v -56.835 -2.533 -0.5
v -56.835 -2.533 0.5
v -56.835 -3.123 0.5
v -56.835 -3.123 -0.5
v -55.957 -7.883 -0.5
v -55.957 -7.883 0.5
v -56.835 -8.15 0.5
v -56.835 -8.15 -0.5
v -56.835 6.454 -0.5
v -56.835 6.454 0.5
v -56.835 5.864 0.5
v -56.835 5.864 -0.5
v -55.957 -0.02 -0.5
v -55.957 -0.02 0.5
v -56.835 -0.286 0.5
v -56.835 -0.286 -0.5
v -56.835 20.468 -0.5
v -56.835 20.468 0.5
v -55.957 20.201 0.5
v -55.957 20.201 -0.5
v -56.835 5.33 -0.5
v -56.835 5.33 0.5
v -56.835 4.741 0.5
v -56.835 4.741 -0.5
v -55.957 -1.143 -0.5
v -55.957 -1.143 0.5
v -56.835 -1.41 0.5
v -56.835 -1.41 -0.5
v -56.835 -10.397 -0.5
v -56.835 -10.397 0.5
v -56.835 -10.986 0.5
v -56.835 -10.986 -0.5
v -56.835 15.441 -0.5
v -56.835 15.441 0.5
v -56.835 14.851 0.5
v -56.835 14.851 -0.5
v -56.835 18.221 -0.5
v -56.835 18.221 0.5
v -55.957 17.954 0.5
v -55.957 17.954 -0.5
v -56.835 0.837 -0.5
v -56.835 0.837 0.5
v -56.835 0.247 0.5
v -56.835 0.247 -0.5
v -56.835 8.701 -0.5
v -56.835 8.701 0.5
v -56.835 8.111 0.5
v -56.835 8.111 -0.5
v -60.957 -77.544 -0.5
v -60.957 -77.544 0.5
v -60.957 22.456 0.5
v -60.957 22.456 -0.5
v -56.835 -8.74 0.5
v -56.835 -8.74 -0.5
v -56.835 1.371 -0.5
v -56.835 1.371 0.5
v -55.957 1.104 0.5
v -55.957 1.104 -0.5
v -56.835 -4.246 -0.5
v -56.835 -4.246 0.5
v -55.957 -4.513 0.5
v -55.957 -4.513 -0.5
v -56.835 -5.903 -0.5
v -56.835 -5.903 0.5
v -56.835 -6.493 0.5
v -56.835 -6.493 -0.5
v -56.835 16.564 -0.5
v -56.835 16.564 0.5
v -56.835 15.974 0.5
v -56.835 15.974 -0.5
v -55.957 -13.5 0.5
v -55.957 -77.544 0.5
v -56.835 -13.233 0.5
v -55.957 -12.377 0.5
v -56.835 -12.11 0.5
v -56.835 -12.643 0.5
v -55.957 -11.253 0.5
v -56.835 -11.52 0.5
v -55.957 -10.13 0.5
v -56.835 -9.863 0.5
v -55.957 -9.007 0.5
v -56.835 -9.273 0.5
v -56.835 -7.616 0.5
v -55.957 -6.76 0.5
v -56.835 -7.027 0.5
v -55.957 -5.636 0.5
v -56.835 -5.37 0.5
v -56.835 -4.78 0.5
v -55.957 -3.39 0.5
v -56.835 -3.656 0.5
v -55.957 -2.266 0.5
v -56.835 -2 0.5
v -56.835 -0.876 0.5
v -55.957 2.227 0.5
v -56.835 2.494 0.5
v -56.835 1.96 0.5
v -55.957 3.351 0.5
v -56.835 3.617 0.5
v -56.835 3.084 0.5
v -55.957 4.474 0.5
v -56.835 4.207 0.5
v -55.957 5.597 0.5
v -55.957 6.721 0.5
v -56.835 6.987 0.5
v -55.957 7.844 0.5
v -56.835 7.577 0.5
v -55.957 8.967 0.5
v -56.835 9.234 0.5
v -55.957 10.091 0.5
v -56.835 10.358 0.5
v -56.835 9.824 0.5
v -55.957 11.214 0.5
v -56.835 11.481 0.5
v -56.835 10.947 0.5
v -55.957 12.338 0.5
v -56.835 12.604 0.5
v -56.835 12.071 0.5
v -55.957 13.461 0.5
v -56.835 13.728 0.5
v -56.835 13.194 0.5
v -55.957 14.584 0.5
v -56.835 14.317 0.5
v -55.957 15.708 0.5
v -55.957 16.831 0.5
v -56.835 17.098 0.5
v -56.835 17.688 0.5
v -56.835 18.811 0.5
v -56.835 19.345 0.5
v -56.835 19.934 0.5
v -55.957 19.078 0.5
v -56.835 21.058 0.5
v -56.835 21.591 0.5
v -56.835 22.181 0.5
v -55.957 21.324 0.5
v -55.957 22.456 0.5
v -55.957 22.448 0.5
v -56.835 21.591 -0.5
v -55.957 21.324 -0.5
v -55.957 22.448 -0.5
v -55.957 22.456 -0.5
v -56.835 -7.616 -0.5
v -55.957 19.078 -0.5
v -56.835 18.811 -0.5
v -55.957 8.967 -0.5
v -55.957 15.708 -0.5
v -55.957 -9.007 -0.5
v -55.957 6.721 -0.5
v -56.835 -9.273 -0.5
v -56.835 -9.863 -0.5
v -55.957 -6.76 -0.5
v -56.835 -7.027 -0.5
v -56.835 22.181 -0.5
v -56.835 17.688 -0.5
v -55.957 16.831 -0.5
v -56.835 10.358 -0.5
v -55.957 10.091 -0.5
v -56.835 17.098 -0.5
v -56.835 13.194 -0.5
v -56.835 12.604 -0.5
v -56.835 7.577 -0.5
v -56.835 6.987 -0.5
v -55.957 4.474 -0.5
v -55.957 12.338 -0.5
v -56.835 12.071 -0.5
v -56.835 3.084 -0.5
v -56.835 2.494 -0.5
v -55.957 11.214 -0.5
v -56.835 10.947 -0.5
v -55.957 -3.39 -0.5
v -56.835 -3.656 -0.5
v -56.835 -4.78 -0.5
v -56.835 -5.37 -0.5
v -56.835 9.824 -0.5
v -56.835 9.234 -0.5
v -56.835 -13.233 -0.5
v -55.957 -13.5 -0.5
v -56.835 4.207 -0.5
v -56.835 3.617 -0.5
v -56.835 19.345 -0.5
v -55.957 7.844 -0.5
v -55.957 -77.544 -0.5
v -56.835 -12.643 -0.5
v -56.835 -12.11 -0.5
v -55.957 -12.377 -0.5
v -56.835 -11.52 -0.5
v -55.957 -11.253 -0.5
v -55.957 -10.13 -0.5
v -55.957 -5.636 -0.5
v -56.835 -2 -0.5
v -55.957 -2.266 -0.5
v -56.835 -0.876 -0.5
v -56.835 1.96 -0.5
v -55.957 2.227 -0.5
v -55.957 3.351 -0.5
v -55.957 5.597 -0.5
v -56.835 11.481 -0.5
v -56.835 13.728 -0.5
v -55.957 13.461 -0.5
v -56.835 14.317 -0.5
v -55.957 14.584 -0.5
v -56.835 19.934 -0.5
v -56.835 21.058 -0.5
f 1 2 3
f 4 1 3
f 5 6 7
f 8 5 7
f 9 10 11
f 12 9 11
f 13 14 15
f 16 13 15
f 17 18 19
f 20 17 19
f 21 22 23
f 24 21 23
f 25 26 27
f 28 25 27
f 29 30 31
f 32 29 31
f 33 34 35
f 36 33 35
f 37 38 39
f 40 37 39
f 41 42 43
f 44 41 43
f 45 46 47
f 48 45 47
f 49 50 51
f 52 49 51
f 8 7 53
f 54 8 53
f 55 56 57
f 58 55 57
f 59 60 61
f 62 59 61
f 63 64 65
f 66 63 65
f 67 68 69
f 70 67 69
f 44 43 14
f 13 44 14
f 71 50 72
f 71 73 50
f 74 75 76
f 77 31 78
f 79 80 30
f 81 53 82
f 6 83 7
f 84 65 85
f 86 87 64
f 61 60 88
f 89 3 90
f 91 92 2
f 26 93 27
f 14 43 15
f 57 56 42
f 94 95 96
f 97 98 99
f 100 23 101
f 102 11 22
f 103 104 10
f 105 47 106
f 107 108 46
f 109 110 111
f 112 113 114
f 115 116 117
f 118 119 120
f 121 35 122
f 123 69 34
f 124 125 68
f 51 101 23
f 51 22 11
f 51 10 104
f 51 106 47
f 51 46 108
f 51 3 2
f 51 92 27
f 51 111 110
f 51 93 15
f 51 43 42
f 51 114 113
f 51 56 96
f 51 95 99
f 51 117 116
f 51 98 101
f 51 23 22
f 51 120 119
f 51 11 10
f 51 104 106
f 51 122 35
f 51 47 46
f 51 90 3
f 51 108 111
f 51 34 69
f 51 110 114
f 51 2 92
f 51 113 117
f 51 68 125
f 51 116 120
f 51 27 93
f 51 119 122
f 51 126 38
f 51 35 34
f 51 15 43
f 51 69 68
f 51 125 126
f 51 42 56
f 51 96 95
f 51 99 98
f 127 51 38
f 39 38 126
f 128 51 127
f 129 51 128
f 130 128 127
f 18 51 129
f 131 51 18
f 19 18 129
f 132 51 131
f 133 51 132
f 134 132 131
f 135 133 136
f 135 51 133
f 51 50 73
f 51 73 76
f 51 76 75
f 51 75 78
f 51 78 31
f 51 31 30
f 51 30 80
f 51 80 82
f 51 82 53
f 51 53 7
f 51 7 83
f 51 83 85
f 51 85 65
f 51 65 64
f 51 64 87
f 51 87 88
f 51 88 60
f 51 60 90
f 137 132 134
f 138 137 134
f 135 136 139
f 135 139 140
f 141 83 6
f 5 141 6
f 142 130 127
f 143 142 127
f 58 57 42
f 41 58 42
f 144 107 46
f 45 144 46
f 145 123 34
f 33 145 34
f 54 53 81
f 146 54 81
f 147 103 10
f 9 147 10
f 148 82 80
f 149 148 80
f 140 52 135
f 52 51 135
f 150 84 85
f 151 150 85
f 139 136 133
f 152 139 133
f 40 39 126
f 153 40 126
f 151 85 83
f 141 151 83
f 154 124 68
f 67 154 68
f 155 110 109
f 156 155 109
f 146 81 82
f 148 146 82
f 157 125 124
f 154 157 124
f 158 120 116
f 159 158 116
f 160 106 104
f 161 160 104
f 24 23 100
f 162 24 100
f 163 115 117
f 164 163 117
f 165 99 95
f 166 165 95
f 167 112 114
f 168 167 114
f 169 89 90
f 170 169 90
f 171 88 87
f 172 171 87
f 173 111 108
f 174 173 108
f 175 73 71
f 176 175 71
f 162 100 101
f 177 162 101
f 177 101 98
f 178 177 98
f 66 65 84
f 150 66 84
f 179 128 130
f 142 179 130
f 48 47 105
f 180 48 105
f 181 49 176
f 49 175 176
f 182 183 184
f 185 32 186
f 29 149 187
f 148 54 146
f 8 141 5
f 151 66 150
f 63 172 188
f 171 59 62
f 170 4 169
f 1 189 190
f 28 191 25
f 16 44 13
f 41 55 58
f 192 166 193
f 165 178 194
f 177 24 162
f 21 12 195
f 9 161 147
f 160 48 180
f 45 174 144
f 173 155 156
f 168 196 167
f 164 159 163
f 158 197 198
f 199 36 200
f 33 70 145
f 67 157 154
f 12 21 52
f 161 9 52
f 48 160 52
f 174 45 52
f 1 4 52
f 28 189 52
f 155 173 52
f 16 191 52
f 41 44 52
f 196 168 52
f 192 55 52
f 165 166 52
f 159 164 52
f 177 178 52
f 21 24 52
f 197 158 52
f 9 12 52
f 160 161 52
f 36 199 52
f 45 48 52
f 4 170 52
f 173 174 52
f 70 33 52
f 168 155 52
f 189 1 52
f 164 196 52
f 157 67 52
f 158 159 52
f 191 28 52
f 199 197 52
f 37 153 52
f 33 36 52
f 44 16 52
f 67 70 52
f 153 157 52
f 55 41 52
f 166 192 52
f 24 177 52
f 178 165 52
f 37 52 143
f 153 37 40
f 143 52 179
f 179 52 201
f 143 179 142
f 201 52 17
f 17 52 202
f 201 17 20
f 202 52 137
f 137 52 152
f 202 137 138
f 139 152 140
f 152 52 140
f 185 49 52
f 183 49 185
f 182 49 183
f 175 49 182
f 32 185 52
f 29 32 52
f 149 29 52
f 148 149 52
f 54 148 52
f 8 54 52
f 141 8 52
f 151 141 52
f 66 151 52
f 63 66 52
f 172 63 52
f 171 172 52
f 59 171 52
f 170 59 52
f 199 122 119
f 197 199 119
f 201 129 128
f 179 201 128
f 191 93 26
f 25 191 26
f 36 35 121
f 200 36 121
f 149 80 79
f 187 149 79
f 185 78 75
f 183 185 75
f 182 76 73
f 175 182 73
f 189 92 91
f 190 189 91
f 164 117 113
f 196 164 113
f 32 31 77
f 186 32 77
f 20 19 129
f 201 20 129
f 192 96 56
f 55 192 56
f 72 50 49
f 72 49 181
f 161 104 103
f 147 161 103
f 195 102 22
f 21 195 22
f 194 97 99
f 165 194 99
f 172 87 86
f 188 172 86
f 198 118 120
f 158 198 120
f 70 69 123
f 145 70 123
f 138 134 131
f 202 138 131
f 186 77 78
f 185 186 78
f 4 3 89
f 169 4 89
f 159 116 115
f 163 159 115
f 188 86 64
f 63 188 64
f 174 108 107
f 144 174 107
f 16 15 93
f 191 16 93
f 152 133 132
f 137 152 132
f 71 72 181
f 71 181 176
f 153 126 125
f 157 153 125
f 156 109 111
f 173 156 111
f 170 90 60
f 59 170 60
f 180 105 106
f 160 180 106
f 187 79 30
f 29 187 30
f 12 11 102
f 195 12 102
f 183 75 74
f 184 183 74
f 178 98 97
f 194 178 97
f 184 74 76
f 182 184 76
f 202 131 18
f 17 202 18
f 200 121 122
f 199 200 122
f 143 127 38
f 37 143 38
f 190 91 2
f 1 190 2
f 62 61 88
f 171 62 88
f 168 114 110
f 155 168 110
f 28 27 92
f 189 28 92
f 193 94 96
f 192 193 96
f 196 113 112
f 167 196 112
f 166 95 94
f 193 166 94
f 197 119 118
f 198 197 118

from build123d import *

# Parameters (mm, degrees)
F0_W     = 5
F0_H     = 100
F1_DEPTH = 0.5
F3_DEPTH = 25


with BuildPart() as f1:
    # F0 (on Top) → F1 (new body, symmetric)
    with BuildSketch(Plane.XY):
        with Locations((-58.457311, -27.543506)):
            Rectangle(F0_W, F0_H)
    extrude(amount=F1_DEPTH, both=True)

    # F2 (on face) → F3 (cut)
    with BuildSketch(Plane.XY.offset(0.5)):
        Polygon((-55.957311, 22.447845), (-56.83507, 22.18105), (-56.83507, 21.59127), (-55.957311, 21.324475), align=None)
        Polygon((-55.957311, 20.201105), (-55.957311, 21.324475), (-56.83507, 21.05768), (-56.83507, 20.4679), align=None)
        Polygon((-55.957311, 19.077735), (-55.957311, 20.201105), (-56.83507, 19.93431), (-56.83507, 19.34453), align=None)
        Polygon((-55.957311, 17.954365), (-55.957311, 19.077735), (-56.83507, 18.81094), (-56.83507, 18.22116), align=None)
        Polygon((-55.957311, 16.830995), (-55.957311, 17.954365), (-56.83507, 17.68757), (-56.83507, 17.09779), align=None)
        Polygon((-55.957311, 15.707625), (-55.957311, 16.830995), (-56.83507, 16.5642), (-56.83507, 15.97442), align=None)
        Polygon((-55.957311, 14.584255), (-55.957311, 15.707625), (-56.83507, 15.44083), (-56.83507, 14.85105), align=None)
        Polygon((-55.957311, 13.460885), (-55.957311, 14.584255), (-56.83507, 14.31746), (-56.83507, 13.72768), align=None)
        Polygon((-55.957311, 12.337515), (-55.957311, 13.460885), (-56.83507, 13.19409), (-56.83507, 12.60431), align=None)
        Polygon((-55.957311, 11.214145), (-55.957311, 12.337515), (-56.83507, 12.07072), (-56.83507, 11.48094), align=None)
        Polygon((-55.957311, 10.090775), (-55.957311, 11.214145), (-56.83507, 10.94735), (-56.83507, 10.35757), align=None)
        Polygon((-55.957311, 8.967405), (-55.957311, 10.090775), (-56.83507, 9.82398), (-56.83507, 9.2342), align=None)
        Polygon((-55.957311, 7.844035), (-55.957311, 8.967405), (-56.83507, 8.70061), (-56.83507, 8.11083), align=None)
        Polygon((-55.957311, 6.720665), (-55.957311, 7.844035), (-56.83507, 7.57724), (-56.83507, 6.98746), align=None)
        Polygon((-55.957311, 5.597295), (-55.957311, 6.720665), (-56.83507, 6.45387), (-56.83507, 5.86409), align=None)
        Polygon((-55.957311, 4.473925), (-55.957311, 5.597295), (-56.83507, 5.3305), (-56.83507, 4.74072), align=None)
        Polygon((-55.957311, 3.350555), (-55.957311, 4.473925), (-56.83507, 4.20713), (-56.83507, 3.61735), align=None)
        Polygon((-55.957311, 2.227185), (-55.957311, 3.350555), (-56.83507, 3.08376), (-56.83507, 2.49398), align=None)
        Polygon((-55.957311, 1.103815), (-55.957311, 2.227185), (-56.83507, 1.96039), (-56.83507, 1.37061), align=None)
        Polygon((-56.83507, 0.24724), (-55.957311, -0.019555), (-55.957311, 1.103815), (-56.83507, 0.83702), align=None)
        Polygon((-56.83507, -0.87613), (-55.957311, -1.142925), (-55.957311, -0.019555), (-56.83507, -0.28635), align=None)
        Polygon((-56.83507, -1.9995), (-55.957311, -2.266295), (-55.957311, -1.142925), (-56.83507, -1.40972), align=None)
        Polygon((-56.83507, -3.12287), (-55.957311, -3.389665), (-55.957311, -2.266295), (-56.83507, -2.53309), align=None)
        Polygon((-56.83507, -4.24624), (-55.957311, -4.513035), (-55.957311, -3.389665), (-56.83507, -3.65646), align=None)
        Polygon((-56.83507, -5.36961), (-55.957311, -5.636405), (-55.957311, -4.513035), (-56.83507, -4.77983), align=None)
        Polygon((-56.83507, -6.49298), (-55.957311, -6.759775), (-55.957311, -5.636405), (-56.83507, -5.9032), align=None)
        Polygon((-56.83507, -7.61635), (-55.957311, -7.883145), (-55.957311, -6.759775), (-56.83507, -7.02657), align=None)
        Polygon((-56.83507, -8.73972), (-55.957311, -9.006515), (-55.957311, -7.883145), (-56.83507, -8.14994), align=None)
        Polygon((-56.83507, -9.86309), (-55.957311, -10.129885), (-55.957311, -9.006515), (-56.83507, -9.27331), align=None)
        Polygon((-56.83507, -10.98646), (-55.957311, -11.253255), (-55.957311, -10.129885), (-56.83507, -10.39668), align=None)
        Polygon((-56.83507, -12.10983), (-55.957311, -12.376625), (-55.957311, -11.253255), (-56.83507, -11.52005), align=None)
        Polygon((-56.83507, -13.2332), (-55.957311, -13.499995), (-55.957311, -12.376625), (-56.83507, -12.64342), align=None)
    extrude(amount=-F3_DEPTH, mode=Mode.SUBTRACT)


solid = f1.part
